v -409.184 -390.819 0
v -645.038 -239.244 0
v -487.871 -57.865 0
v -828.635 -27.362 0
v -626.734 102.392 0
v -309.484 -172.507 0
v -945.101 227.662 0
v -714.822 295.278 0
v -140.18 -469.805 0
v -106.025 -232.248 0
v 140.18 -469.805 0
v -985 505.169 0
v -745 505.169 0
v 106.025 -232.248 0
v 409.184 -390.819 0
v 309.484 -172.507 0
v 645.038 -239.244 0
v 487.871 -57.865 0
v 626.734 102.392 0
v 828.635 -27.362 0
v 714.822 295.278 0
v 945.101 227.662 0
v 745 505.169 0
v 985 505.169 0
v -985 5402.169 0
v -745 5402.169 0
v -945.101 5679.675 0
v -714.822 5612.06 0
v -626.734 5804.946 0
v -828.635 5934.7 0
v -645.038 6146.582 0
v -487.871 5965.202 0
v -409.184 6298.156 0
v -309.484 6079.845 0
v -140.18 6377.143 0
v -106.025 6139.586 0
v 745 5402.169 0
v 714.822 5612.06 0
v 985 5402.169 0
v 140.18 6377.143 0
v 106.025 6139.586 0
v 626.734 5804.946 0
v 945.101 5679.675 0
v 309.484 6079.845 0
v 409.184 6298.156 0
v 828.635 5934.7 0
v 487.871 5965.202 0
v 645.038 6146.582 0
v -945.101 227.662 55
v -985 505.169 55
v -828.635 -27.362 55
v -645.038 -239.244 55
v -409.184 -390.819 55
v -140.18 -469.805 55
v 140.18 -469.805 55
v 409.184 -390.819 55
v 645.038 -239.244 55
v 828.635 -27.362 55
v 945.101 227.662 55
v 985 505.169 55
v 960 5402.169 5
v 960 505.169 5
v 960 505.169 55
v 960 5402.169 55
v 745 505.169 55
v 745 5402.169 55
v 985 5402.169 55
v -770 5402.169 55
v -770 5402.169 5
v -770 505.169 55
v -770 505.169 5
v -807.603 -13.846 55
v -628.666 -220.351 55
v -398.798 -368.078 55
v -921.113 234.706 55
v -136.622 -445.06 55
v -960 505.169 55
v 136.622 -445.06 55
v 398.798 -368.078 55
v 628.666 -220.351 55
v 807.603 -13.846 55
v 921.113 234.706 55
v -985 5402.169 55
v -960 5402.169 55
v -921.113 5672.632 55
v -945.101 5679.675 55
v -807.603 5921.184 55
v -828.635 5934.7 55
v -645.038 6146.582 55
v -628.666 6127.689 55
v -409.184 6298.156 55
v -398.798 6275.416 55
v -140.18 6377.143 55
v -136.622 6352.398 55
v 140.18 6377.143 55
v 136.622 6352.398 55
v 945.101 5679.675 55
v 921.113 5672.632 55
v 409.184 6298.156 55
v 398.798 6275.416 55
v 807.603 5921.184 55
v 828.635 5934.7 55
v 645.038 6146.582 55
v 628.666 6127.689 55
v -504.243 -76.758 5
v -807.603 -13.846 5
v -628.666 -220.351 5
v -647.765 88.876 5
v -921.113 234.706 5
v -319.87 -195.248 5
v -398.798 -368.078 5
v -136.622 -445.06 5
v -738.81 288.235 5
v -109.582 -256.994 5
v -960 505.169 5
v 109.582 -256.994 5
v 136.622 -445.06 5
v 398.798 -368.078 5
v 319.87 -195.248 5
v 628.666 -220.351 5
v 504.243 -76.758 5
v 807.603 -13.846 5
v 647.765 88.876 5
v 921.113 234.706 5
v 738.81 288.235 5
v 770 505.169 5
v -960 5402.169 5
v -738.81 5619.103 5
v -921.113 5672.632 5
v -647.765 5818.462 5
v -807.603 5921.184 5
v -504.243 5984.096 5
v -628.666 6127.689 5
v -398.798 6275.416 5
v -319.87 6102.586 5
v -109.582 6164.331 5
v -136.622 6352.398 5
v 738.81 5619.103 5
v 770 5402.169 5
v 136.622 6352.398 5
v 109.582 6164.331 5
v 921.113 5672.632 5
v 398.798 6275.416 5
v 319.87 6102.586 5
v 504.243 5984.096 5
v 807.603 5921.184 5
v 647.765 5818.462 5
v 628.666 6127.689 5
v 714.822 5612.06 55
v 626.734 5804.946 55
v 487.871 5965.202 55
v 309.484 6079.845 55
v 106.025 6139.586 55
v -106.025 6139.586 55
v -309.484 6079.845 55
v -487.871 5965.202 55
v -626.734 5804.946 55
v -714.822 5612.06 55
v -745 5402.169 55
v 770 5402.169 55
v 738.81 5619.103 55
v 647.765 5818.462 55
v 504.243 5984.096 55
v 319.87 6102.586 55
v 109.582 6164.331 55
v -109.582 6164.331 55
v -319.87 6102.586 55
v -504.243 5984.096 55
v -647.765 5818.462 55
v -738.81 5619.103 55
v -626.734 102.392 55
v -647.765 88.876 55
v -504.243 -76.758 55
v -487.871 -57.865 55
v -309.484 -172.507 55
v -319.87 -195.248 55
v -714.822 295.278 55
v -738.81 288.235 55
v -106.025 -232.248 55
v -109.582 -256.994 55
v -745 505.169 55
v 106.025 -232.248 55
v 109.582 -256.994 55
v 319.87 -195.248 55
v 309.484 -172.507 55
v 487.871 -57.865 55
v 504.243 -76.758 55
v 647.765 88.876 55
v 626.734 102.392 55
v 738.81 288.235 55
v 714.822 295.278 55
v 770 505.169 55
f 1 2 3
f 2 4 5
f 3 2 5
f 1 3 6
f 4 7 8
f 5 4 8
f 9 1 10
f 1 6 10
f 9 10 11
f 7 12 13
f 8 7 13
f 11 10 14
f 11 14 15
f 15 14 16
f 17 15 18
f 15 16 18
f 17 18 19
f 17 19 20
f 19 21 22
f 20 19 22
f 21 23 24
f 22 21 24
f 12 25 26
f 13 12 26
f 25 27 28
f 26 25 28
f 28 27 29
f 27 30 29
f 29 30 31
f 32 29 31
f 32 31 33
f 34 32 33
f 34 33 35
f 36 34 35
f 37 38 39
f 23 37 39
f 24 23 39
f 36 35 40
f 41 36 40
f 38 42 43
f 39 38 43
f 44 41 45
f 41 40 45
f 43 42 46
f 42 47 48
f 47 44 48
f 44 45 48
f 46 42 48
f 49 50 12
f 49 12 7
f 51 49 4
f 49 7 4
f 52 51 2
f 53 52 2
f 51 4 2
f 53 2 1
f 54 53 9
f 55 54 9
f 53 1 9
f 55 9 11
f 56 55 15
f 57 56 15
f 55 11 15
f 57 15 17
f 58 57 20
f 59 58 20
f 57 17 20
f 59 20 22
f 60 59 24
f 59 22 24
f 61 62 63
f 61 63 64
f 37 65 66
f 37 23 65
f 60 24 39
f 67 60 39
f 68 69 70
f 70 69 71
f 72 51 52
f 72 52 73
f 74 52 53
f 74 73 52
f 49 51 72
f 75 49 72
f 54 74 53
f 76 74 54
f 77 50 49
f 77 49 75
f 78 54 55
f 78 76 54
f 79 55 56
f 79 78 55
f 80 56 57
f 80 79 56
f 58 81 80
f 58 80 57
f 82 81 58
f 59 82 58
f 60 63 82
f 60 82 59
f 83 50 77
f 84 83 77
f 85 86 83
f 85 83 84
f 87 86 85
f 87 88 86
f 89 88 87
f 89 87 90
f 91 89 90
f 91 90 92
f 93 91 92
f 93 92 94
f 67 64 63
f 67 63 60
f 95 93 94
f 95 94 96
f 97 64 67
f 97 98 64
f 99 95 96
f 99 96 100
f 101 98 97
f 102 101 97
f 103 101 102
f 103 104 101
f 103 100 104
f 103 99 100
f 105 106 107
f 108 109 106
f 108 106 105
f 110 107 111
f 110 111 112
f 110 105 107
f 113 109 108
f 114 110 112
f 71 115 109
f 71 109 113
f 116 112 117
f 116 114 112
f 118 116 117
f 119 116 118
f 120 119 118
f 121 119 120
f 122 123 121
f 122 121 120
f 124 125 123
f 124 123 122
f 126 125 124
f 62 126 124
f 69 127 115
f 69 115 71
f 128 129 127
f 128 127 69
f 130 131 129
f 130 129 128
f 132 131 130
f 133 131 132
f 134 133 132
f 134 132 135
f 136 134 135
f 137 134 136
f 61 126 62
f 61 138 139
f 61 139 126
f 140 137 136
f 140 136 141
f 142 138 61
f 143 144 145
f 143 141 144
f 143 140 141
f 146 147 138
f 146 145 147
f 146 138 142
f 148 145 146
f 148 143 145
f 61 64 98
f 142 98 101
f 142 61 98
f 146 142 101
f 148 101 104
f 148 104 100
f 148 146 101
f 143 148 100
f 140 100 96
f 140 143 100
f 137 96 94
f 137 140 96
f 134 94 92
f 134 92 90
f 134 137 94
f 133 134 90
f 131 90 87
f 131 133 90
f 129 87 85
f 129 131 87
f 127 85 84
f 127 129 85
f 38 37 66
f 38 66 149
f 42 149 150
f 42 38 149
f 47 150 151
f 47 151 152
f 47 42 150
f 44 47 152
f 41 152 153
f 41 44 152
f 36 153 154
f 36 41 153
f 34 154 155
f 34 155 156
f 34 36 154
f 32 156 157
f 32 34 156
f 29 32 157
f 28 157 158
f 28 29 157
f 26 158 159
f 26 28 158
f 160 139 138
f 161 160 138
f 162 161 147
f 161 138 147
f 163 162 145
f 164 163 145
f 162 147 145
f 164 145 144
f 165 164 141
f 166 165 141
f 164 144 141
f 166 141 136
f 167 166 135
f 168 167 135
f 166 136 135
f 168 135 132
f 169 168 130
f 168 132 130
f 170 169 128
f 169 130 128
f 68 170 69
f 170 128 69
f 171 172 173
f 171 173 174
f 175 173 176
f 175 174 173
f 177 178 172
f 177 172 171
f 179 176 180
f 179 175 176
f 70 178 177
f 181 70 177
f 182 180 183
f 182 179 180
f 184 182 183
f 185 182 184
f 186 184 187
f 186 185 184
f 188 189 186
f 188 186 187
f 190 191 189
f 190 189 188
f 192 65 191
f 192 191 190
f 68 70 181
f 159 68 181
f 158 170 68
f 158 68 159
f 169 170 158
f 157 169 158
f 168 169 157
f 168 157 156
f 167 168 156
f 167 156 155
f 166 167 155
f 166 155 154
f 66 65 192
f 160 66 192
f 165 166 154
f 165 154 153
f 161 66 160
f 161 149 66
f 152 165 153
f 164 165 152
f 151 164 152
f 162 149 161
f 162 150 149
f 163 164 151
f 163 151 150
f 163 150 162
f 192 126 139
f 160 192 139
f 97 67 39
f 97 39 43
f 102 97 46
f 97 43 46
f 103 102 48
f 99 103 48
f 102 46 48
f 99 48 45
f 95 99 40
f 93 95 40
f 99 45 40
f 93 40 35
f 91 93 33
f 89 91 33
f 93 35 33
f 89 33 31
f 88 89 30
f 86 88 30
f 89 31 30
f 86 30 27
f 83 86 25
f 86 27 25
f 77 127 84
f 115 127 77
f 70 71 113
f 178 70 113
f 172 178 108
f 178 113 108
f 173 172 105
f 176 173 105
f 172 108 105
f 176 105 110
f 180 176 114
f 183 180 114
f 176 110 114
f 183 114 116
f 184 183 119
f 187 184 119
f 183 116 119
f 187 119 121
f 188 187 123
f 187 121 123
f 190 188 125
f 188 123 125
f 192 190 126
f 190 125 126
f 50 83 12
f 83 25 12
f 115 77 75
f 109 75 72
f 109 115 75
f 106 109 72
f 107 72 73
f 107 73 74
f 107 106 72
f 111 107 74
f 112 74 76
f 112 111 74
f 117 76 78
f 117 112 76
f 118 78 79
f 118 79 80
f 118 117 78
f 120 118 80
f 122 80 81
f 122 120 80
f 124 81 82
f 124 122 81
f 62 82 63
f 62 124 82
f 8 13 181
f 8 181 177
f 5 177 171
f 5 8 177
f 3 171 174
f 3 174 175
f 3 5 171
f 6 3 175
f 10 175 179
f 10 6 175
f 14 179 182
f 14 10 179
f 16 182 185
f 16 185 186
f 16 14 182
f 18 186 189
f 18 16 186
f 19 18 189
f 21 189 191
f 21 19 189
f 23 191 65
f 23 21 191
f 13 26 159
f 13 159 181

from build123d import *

# Parameters (mm, degrees)
BOSS_EXTRUDE1_DEPTH = 5
BOSS_EXTRUDE2_DEPTH = 50
BOSS_EXTRUDE3_DEPTH = 50


with BuildPart() as part:
    # Sketch1 → Boss-Extrude1 (new body)
    with BuildSketch(Plane.XY):
        with BuildLine():
            Line((-985, 5402.168929815), (-985, 505.168929815))
            ThreePointArc((-985, 505.168929815), (0, -479.831070185), (985, 505.168929815))
            Line((985, 505.168929815), (985, 5402.168929815))
            ThreePointArc((985, 5402.168929815), (0, 6387.168929815), (-985, 5402.168929815))
        make_face()
        with BuildLine():
            Line((-745, 5402.168929815), (-745, 505.168929815))
            ThreePointArc((-745, 505.168929815), (0, -239.831070185), (745, 505.168929815))
            Line((745, 505.168929815), (745, 5402.168929815))
            ThreePointArc((745, 5402.168929815), (0, 6147.168929815), (-745, 5402.168929815))
        make_face(mode=Mode.SUBTRACT)
    extrude(amount=BOSS_EXTRUDE1_DEPTH)

    # Sketch2 → Boss-Extrude2 (add)
    with BuildSketch(Plane.XY.offset(5)):
        with BuildLine():
            Line((-770, 5402.168929815), (-770, 505.168929815))
            ThreePointArc((-770, 505.168929815), (0, -264.831070185), (770, 505.168929815))
            Line((770, 505.168929815), (770, 5402.168929815))
            ThreePointArc((770, 5402.168929815), (0, 6172.168929815), (-770, 5402.168929815))
        make_face()
        with BuildLine():
            Line((745, 505.168929815), (745, 5402.168929815))
            ThreePointArc((745, 5402.168929815), (0, 6147.168929815), (-745, 5402.168929815))
            Line((-745, 5402.168929815), (-745, 505.168929815))
            ThreePointArc((-745, 505.168929815), (0, -239.831070185), (745, 505.168929815))
        make_face(mode=Mode.SUBTRACT)
    extrude(amount=BOSS_EXTRUDE2_DEPTH)

    # Sketch3 → Boss-Extrude3 (add)
    with BuildSketch(Plane.XY.offset(5)):
        with BuildLine():
            Line((985, 505.168929815), (985, 5402.168929815))
            ThreePointArc((985, 5402.168929815), (0, 6387.168929815), (-985, 5402.168929815))
            Line((-985, 5402.168929815), (-985, 505.168929815))
            ThreePointArc((-985, 505.168929815), (0, -479.831070185), (985, 505.168929815))
        make_face()
        with BuildLine():
            Line((-960, 5402.168929815), (-960, 505.168929815))
            ThreePointArc((-960, 505.168929815), (0, -454.831070185), (960, 505.168929815))
            Line((960, 505.168929815), (960, 5402.168929815))
            ThreePointArc((960, 5402.168929815), (0, 6362.168929815), (-960, 5402.168929815))
        make_face(mode=Mode.SUBTRACT)
    extrude(amount=BOSS_EXTRUDE3_DEPTH)


solid = part.part
